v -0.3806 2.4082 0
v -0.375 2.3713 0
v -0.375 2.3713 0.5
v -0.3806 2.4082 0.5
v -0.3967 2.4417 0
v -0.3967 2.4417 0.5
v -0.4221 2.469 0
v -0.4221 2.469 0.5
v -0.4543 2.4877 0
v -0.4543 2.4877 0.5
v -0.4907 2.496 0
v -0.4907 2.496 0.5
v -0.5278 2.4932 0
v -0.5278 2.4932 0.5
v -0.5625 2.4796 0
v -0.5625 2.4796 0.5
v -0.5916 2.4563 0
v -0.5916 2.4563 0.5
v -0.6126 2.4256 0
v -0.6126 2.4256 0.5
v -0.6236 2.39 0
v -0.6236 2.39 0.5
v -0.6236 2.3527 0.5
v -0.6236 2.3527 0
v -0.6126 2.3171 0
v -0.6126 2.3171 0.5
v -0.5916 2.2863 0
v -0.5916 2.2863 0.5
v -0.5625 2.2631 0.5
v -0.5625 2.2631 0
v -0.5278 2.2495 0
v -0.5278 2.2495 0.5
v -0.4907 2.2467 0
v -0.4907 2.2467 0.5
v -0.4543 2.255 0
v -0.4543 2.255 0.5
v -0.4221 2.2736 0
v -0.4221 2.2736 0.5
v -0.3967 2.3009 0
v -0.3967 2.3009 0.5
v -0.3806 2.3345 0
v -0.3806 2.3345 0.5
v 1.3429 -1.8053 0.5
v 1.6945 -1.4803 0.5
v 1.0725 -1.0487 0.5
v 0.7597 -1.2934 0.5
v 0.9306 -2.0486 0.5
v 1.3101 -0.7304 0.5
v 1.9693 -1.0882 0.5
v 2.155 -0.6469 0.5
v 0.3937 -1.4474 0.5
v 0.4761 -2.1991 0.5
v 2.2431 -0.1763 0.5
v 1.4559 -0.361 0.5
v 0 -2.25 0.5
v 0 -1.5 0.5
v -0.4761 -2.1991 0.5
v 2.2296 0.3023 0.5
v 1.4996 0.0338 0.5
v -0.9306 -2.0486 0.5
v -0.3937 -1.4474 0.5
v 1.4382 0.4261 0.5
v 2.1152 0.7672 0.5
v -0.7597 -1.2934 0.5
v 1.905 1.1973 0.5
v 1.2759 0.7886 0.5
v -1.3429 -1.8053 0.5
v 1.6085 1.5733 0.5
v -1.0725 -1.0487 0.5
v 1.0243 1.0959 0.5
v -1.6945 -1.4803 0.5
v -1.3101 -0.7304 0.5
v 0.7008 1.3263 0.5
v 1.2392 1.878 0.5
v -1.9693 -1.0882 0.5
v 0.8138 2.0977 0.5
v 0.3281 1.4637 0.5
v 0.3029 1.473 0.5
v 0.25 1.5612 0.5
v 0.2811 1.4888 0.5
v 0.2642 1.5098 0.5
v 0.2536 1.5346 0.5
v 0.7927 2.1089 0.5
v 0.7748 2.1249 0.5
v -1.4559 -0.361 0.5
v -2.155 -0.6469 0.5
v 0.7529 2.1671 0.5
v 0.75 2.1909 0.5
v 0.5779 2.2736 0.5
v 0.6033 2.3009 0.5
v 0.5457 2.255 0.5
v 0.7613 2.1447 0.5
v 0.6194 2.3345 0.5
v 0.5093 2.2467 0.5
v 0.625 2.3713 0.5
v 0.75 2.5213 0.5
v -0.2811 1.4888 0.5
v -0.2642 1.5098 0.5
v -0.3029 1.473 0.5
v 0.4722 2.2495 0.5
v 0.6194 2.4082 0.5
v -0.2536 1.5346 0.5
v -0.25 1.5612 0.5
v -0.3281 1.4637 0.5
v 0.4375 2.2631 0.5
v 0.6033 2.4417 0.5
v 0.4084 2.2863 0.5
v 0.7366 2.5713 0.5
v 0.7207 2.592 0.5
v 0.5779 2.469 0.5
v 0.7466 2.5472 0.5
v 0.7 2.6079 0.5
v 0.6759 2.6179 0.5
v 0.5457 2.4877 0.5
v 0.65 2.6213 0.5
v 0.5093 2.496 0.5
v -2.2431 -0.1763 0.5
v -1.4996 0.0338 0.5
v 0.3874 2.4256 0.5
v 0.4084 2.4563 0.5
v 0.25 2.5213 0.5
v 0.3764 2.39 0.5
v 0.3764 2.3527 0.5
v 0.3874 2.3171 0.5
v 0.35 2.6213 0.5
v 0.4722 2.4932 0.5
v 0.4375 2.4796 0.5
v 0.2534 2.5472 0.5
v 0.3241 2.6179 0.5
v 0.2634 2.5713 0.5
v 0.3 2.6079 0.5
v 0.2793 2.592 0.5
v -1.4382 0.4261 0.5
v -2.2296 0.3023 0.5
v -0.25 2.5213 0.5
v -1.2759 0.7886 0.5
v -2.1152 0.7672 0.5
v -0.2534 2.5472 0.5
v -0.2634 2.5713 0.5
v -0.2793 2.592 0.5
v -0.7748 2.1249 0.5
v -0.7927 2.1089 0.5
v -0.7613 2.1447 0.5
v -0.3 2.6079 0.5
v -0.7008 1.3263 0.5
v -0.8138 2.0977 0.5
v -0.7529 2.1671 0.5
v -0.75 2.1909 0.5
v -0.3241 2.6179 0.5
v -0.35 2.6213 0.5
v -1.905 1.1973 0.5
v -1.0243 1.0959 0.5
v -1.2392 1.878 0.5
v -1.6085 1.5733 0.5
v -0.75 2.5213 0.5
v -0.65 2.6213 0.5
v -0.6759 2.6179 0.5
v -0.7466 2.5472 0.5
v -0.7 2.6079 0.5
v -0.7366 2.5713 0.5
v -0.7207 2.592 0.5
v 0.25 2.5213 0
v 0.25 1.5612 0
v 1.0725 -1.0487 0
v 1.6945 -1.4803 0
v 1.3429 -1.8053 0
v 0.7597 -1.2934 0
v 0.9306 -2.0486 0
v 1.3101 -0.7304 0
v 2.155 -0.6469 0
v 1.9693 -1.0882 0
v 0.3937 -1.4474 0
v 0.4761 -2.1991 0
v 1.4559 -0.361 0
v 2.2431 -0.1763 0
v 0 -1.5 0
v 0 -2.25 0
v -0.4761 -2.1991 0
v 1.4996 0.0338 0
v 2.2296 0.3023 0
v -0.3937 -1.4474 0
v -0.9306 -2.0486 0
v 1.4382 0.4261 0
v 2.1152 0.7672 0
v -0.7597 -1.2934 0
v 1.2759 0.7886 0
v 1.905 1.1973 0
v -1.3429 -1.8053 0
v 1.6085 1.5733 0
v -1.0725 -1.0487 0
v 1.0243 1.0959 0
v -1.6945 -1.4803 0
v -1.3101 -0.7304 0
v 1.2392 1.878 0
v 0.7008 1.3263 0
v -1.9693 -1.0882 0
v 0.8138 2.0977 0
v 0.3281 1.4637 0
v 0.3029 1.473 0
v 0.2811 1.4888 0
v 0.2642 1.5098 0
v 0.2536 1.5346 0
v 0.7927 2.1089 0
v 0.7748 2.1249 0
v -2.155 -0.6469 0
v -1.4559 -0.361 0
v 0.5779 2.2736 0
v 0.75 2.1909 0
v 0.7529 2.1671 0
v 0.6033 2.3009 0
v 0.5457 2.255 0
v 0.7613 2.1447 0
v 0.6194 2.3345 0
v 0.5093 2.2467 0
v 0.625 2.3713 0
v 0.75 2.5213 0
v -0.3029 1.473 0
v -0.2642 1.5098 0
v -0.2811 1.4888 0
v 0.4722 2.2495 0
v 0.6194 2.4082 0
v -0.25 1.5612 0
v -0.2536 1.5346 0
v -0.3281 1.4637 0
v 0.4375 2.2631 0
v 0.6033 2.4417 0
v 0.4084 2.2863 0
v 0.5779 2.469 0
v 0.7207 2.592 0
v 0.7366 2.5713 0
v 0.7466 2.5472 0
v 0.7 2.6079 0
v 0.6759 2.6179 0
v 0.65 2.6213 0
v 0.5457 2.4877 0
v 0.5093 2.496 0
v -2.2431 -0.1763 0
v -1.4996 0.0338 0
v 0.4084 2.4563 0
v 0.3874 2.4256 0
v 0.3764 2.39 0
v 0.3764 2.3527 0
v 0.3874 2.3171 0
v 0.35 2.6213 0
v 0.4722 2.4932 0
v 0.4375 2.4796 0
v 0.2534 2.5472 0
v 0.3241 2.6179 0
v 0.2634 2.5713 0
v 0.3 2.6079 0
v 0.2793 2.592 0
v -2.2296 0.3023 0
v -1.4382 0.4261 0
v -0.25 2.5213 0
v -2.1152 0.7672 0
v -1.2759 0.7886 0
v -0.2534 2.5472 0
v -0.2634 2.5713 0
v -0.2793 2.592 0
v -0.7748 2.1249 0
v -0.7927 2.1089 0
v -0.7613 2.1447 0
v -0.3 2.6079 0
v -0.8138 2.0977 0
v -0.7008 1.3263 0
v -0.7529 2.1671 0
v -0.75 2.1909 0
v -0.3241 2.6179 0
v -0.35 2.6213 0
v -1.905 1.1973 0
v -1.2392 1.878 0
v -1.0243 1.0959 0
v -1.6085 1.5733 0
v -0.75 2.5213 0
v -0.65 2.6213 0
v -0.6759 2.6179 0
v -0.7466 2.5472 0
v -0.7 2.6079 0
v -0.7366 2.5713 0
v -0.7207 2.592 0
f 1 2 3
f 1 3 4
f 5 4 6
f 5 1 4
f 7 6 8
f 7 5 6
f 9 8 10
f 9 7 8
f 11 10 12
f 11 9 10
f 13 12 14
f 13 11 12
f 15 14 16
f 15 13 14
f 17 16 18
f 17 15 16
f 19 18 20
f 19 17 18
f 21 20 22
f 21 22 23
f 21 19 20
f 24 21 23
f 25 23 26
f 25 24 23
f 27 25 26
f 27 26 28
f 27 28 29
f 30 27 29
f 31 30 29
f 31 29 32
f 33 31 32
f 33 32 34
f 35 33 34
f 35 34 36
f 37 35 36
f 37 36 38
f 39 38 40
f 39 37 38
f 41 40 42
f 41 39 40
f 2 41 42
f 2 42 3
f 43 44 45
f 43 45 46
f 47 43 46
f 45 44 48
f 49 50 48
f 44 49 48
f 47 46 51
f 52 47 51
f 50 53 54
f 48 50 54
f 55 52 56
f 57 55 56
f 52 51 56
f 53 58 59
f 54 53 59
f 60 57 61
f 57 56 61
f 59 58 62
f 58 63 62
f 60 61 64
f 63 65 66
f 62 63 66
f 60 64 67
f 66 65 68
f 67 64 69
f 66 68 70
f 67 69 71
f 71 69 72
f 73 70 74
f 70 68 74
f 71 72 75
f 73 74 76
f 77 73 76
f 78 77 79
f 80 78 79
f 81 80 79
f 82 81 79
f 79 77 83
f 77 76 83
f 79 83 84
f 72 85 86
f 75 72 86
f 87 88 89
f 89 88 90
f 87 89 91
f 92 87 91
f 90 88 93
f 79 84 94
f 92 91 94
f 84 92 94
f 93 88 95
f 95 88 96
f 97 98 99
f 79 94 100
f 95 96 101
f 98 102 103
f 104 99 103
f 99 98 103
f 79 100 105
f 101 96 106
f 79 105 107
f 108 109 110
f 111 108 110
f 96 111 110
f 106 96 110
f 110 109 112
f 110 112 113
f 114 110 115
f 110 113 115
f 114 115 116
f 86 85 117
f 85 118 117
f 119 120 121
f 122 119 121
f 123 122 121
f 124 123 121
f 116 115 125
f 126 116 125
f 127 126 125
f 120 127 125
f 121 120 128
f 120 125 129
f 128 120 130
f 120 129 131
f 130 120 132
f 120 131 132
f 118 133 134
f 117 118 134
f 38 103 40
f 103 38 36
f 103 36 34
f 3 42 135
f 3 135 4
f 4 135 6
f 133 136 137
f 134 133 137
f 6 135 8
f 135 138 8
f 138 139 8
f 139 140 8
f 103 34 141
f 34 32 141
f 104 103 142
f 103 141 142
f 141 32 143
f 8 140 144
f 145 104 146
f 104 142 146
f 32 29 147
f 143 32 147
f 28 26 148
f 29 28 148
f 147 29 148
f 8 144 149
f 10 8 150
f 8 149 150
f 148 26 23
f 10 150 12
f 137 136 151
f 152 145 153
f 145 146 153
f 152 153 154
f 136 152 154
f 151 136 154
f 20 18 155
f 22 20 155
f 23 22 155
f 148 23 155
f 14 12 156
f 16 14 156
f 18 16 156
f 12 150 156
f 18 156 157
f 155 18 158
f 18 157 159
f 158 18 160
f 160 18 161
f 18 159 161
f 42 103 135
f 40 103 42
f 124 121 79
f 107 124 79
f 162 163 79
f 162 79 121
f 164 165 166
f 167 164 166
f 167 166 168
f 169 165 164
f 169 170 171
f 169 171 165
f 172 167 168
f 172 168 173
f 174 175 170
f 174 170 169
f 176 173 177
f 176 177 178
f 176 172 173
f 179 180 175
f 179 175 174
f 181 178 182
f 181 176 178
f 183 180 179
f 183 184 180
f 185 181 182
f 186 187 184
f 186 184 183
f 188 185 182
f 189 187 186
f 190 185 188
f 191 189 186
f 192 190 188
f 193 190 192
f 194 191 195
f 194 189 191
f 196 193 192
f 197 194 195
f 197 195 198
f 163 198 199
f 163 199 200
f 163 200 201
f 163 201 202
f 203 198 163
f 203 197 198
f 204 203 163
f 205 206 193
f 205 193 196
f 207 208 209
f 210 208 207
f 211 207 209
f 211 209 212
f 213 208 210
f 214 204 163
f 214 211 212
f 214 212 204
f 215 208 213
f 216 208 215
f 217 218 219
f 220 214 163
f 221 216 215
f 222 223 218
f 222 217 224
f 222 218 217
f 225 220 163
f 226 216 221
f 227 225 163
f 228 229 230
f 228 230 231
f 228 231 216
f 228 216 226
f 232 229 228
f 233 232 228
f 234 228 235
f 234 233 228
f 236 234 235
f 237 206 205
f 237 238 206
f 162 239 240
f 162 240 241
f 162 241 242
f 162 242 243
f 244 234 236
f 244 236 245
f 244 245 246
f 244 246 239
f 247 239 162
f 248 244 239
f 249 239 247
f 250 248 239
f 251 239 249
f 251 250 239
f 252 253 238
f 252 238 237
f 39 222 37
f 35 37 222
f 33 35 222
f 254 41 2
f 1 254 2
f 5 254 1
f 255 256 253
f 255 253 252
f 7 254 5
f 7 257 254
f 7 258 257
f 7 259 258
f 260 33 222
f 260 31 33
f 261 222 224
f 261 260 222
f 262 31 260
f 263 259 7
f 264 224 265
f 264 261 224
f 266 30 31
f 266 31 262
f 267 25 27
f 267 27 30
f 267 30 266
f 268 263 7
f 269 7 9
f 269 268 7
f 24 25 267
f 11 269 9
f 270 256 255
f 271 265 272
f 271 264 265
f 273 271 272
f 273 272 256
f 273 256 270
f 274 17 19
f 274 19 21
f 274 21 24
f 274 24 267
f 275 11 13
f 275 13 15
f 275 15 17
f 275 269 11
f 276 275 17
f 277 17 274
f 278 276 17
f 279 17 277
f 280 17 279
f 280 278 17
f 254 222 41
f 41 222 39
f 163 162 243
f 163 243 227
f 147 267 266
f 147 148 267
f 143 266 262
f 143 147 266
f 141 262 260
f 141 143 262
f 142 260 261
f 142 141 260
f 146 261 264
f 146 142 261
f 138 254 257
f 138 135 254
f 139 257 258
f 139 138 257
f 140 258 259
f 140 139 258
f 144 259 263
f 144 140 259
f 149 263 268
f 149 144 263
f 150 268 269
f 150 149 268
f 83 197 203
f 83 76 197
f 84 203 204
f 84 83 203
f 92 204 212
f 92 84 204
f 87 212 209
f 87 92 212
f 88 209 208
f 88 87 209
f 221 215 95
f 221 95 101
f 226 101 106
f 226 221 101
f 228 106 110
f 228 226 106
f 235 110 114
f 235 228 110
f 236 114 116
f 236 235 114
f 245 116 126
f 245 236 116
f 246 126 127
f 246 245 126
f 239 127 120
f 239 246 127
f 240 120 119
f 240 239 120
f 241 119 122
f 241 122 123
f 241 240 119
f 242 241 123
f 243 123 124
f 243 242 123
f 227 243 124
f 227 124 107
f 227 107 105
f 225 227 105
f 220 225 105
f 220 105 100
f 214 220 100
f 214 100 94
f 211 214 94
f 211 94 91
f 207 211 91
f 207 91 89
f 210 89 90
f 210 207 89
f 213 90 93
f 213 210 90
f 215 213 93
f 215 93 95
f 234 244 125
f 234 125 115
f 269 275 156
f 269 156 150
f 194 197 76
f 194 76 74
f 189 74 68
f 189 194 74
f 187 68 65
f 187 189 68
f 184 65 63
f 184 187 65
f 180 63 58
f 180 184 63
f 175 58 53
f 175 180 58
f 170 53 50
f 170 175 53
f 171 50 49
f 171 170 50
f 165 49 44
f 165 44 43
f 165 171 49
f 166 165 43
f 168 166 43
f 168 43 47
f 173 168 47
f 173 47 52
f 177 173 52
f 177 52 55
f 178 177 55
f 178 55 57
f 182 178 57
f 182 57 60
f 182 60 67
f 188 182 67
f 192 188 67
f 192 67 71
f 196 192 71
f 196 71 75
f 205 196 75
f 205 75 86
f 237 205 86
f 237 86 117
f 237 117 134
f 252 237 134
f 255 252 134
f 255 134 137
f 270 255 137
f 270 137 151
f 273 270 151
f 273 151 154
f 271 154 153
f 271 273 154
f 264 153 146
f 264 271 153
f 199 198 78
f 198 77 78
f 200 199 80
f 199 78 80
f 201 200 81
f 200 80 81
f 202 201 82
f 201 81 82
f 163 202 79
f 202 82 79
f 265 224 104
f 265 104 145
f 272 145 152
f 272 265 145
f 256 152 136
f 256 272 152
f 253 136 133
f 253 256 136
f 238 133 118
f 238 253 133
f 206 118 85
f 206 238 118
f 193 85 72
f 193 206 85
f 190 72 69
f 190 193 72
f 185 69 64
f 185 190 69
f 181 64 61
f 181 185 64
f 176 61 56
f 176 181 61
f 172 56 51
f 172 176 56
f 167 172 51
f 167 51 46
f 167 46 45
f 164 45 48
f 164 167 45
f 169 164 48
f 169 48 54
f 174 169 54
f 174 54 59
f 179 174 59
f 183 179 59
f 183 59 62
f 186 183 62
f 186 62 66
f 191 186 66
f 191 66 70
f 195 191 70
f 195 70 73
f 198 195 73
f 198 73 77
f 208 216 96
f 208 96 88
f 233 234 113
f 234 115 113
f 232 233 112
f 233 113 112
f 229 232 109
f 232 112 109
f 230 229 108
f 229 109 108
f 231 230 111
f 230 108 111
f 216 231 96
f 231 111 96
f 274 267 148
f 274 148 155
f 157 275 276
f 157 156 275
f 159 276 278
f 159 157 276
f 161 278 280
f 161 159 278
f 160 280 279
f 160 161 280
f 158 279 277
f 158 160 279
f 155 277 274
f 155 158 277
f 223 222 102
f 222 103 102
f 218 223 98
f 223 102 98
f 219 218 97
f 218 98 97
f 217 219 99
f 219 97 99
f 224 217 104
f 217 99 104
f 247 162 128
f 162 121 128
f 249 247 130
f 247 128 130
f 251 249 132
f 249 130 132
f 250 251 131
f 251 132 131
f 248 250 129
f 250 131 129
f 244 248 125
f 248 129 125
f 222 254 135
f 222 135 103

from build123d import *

# Parameters (mm, degrees)
SKETCH1_R           = 0.125
BOSS_EXTRUDE1_DEPTH = 0.5
FILLET1_R           = 0.1


with BuildPart() as part:
    # Sketch1 → Boss-Extrude1 (new body)
    with BuildSketch(Plane.XY):
        with BuildLine():
            Line((-0.25, 2.621320344), (-0.25, 1.479019946))
            ThreePointArc((-0.25, 1.479019946), (0, -1.5), (0.25, 1.479019946))
            Line((0.25, 1.479019946), (0.25, 2.621320344))
            Line((0.25, 2.621320344), (0.75, 2.621320344))
            Line((0.75, 2.621320344), (0.75, 2.121320344))
            ThreePointArc((0.75, 2.121320344), (0, -2.25), (-0.75, 2.121320344))
            Line((-0.75, 2.121320344), (-0.75, 2.621320344))
            Line((-0.75, 2.621320344), (-0.25, 2.621320344))
        make_face()
        with Locations((-0.5, 2.371320344)):
            Circle(SKETCH1_R, mode=Mode.SUBTRACT)
        with Locations((0.5, 2.371320344)):
            Circle(SKETCH1_R, mode=Mode.SUBTRACT)
    extrude(amount=BOSS_EXTRUDE1_DEPTH)

    # Fillet1
    fillet1_edges = [part.edges().sort_by_distance(p)[0] for p in [
        (-0.25, 2.621320344, 0.25),
        (-0.25, 1.479019946, 0.25),
        (0.25, 1.479019946, 0.25),
        (0.25, 2.621320344, 0.25),
        (0.75, 2.621320344, 0.25),
        (0.75, 2.121320344, 0.25),
        (-0.75, 2.121320344, 0.25),
        (-0.75, 2.621320344, 0.25),
    ]]
    fillet(fillet1_edges, radius=FILLET1_R)


solid = part.part
